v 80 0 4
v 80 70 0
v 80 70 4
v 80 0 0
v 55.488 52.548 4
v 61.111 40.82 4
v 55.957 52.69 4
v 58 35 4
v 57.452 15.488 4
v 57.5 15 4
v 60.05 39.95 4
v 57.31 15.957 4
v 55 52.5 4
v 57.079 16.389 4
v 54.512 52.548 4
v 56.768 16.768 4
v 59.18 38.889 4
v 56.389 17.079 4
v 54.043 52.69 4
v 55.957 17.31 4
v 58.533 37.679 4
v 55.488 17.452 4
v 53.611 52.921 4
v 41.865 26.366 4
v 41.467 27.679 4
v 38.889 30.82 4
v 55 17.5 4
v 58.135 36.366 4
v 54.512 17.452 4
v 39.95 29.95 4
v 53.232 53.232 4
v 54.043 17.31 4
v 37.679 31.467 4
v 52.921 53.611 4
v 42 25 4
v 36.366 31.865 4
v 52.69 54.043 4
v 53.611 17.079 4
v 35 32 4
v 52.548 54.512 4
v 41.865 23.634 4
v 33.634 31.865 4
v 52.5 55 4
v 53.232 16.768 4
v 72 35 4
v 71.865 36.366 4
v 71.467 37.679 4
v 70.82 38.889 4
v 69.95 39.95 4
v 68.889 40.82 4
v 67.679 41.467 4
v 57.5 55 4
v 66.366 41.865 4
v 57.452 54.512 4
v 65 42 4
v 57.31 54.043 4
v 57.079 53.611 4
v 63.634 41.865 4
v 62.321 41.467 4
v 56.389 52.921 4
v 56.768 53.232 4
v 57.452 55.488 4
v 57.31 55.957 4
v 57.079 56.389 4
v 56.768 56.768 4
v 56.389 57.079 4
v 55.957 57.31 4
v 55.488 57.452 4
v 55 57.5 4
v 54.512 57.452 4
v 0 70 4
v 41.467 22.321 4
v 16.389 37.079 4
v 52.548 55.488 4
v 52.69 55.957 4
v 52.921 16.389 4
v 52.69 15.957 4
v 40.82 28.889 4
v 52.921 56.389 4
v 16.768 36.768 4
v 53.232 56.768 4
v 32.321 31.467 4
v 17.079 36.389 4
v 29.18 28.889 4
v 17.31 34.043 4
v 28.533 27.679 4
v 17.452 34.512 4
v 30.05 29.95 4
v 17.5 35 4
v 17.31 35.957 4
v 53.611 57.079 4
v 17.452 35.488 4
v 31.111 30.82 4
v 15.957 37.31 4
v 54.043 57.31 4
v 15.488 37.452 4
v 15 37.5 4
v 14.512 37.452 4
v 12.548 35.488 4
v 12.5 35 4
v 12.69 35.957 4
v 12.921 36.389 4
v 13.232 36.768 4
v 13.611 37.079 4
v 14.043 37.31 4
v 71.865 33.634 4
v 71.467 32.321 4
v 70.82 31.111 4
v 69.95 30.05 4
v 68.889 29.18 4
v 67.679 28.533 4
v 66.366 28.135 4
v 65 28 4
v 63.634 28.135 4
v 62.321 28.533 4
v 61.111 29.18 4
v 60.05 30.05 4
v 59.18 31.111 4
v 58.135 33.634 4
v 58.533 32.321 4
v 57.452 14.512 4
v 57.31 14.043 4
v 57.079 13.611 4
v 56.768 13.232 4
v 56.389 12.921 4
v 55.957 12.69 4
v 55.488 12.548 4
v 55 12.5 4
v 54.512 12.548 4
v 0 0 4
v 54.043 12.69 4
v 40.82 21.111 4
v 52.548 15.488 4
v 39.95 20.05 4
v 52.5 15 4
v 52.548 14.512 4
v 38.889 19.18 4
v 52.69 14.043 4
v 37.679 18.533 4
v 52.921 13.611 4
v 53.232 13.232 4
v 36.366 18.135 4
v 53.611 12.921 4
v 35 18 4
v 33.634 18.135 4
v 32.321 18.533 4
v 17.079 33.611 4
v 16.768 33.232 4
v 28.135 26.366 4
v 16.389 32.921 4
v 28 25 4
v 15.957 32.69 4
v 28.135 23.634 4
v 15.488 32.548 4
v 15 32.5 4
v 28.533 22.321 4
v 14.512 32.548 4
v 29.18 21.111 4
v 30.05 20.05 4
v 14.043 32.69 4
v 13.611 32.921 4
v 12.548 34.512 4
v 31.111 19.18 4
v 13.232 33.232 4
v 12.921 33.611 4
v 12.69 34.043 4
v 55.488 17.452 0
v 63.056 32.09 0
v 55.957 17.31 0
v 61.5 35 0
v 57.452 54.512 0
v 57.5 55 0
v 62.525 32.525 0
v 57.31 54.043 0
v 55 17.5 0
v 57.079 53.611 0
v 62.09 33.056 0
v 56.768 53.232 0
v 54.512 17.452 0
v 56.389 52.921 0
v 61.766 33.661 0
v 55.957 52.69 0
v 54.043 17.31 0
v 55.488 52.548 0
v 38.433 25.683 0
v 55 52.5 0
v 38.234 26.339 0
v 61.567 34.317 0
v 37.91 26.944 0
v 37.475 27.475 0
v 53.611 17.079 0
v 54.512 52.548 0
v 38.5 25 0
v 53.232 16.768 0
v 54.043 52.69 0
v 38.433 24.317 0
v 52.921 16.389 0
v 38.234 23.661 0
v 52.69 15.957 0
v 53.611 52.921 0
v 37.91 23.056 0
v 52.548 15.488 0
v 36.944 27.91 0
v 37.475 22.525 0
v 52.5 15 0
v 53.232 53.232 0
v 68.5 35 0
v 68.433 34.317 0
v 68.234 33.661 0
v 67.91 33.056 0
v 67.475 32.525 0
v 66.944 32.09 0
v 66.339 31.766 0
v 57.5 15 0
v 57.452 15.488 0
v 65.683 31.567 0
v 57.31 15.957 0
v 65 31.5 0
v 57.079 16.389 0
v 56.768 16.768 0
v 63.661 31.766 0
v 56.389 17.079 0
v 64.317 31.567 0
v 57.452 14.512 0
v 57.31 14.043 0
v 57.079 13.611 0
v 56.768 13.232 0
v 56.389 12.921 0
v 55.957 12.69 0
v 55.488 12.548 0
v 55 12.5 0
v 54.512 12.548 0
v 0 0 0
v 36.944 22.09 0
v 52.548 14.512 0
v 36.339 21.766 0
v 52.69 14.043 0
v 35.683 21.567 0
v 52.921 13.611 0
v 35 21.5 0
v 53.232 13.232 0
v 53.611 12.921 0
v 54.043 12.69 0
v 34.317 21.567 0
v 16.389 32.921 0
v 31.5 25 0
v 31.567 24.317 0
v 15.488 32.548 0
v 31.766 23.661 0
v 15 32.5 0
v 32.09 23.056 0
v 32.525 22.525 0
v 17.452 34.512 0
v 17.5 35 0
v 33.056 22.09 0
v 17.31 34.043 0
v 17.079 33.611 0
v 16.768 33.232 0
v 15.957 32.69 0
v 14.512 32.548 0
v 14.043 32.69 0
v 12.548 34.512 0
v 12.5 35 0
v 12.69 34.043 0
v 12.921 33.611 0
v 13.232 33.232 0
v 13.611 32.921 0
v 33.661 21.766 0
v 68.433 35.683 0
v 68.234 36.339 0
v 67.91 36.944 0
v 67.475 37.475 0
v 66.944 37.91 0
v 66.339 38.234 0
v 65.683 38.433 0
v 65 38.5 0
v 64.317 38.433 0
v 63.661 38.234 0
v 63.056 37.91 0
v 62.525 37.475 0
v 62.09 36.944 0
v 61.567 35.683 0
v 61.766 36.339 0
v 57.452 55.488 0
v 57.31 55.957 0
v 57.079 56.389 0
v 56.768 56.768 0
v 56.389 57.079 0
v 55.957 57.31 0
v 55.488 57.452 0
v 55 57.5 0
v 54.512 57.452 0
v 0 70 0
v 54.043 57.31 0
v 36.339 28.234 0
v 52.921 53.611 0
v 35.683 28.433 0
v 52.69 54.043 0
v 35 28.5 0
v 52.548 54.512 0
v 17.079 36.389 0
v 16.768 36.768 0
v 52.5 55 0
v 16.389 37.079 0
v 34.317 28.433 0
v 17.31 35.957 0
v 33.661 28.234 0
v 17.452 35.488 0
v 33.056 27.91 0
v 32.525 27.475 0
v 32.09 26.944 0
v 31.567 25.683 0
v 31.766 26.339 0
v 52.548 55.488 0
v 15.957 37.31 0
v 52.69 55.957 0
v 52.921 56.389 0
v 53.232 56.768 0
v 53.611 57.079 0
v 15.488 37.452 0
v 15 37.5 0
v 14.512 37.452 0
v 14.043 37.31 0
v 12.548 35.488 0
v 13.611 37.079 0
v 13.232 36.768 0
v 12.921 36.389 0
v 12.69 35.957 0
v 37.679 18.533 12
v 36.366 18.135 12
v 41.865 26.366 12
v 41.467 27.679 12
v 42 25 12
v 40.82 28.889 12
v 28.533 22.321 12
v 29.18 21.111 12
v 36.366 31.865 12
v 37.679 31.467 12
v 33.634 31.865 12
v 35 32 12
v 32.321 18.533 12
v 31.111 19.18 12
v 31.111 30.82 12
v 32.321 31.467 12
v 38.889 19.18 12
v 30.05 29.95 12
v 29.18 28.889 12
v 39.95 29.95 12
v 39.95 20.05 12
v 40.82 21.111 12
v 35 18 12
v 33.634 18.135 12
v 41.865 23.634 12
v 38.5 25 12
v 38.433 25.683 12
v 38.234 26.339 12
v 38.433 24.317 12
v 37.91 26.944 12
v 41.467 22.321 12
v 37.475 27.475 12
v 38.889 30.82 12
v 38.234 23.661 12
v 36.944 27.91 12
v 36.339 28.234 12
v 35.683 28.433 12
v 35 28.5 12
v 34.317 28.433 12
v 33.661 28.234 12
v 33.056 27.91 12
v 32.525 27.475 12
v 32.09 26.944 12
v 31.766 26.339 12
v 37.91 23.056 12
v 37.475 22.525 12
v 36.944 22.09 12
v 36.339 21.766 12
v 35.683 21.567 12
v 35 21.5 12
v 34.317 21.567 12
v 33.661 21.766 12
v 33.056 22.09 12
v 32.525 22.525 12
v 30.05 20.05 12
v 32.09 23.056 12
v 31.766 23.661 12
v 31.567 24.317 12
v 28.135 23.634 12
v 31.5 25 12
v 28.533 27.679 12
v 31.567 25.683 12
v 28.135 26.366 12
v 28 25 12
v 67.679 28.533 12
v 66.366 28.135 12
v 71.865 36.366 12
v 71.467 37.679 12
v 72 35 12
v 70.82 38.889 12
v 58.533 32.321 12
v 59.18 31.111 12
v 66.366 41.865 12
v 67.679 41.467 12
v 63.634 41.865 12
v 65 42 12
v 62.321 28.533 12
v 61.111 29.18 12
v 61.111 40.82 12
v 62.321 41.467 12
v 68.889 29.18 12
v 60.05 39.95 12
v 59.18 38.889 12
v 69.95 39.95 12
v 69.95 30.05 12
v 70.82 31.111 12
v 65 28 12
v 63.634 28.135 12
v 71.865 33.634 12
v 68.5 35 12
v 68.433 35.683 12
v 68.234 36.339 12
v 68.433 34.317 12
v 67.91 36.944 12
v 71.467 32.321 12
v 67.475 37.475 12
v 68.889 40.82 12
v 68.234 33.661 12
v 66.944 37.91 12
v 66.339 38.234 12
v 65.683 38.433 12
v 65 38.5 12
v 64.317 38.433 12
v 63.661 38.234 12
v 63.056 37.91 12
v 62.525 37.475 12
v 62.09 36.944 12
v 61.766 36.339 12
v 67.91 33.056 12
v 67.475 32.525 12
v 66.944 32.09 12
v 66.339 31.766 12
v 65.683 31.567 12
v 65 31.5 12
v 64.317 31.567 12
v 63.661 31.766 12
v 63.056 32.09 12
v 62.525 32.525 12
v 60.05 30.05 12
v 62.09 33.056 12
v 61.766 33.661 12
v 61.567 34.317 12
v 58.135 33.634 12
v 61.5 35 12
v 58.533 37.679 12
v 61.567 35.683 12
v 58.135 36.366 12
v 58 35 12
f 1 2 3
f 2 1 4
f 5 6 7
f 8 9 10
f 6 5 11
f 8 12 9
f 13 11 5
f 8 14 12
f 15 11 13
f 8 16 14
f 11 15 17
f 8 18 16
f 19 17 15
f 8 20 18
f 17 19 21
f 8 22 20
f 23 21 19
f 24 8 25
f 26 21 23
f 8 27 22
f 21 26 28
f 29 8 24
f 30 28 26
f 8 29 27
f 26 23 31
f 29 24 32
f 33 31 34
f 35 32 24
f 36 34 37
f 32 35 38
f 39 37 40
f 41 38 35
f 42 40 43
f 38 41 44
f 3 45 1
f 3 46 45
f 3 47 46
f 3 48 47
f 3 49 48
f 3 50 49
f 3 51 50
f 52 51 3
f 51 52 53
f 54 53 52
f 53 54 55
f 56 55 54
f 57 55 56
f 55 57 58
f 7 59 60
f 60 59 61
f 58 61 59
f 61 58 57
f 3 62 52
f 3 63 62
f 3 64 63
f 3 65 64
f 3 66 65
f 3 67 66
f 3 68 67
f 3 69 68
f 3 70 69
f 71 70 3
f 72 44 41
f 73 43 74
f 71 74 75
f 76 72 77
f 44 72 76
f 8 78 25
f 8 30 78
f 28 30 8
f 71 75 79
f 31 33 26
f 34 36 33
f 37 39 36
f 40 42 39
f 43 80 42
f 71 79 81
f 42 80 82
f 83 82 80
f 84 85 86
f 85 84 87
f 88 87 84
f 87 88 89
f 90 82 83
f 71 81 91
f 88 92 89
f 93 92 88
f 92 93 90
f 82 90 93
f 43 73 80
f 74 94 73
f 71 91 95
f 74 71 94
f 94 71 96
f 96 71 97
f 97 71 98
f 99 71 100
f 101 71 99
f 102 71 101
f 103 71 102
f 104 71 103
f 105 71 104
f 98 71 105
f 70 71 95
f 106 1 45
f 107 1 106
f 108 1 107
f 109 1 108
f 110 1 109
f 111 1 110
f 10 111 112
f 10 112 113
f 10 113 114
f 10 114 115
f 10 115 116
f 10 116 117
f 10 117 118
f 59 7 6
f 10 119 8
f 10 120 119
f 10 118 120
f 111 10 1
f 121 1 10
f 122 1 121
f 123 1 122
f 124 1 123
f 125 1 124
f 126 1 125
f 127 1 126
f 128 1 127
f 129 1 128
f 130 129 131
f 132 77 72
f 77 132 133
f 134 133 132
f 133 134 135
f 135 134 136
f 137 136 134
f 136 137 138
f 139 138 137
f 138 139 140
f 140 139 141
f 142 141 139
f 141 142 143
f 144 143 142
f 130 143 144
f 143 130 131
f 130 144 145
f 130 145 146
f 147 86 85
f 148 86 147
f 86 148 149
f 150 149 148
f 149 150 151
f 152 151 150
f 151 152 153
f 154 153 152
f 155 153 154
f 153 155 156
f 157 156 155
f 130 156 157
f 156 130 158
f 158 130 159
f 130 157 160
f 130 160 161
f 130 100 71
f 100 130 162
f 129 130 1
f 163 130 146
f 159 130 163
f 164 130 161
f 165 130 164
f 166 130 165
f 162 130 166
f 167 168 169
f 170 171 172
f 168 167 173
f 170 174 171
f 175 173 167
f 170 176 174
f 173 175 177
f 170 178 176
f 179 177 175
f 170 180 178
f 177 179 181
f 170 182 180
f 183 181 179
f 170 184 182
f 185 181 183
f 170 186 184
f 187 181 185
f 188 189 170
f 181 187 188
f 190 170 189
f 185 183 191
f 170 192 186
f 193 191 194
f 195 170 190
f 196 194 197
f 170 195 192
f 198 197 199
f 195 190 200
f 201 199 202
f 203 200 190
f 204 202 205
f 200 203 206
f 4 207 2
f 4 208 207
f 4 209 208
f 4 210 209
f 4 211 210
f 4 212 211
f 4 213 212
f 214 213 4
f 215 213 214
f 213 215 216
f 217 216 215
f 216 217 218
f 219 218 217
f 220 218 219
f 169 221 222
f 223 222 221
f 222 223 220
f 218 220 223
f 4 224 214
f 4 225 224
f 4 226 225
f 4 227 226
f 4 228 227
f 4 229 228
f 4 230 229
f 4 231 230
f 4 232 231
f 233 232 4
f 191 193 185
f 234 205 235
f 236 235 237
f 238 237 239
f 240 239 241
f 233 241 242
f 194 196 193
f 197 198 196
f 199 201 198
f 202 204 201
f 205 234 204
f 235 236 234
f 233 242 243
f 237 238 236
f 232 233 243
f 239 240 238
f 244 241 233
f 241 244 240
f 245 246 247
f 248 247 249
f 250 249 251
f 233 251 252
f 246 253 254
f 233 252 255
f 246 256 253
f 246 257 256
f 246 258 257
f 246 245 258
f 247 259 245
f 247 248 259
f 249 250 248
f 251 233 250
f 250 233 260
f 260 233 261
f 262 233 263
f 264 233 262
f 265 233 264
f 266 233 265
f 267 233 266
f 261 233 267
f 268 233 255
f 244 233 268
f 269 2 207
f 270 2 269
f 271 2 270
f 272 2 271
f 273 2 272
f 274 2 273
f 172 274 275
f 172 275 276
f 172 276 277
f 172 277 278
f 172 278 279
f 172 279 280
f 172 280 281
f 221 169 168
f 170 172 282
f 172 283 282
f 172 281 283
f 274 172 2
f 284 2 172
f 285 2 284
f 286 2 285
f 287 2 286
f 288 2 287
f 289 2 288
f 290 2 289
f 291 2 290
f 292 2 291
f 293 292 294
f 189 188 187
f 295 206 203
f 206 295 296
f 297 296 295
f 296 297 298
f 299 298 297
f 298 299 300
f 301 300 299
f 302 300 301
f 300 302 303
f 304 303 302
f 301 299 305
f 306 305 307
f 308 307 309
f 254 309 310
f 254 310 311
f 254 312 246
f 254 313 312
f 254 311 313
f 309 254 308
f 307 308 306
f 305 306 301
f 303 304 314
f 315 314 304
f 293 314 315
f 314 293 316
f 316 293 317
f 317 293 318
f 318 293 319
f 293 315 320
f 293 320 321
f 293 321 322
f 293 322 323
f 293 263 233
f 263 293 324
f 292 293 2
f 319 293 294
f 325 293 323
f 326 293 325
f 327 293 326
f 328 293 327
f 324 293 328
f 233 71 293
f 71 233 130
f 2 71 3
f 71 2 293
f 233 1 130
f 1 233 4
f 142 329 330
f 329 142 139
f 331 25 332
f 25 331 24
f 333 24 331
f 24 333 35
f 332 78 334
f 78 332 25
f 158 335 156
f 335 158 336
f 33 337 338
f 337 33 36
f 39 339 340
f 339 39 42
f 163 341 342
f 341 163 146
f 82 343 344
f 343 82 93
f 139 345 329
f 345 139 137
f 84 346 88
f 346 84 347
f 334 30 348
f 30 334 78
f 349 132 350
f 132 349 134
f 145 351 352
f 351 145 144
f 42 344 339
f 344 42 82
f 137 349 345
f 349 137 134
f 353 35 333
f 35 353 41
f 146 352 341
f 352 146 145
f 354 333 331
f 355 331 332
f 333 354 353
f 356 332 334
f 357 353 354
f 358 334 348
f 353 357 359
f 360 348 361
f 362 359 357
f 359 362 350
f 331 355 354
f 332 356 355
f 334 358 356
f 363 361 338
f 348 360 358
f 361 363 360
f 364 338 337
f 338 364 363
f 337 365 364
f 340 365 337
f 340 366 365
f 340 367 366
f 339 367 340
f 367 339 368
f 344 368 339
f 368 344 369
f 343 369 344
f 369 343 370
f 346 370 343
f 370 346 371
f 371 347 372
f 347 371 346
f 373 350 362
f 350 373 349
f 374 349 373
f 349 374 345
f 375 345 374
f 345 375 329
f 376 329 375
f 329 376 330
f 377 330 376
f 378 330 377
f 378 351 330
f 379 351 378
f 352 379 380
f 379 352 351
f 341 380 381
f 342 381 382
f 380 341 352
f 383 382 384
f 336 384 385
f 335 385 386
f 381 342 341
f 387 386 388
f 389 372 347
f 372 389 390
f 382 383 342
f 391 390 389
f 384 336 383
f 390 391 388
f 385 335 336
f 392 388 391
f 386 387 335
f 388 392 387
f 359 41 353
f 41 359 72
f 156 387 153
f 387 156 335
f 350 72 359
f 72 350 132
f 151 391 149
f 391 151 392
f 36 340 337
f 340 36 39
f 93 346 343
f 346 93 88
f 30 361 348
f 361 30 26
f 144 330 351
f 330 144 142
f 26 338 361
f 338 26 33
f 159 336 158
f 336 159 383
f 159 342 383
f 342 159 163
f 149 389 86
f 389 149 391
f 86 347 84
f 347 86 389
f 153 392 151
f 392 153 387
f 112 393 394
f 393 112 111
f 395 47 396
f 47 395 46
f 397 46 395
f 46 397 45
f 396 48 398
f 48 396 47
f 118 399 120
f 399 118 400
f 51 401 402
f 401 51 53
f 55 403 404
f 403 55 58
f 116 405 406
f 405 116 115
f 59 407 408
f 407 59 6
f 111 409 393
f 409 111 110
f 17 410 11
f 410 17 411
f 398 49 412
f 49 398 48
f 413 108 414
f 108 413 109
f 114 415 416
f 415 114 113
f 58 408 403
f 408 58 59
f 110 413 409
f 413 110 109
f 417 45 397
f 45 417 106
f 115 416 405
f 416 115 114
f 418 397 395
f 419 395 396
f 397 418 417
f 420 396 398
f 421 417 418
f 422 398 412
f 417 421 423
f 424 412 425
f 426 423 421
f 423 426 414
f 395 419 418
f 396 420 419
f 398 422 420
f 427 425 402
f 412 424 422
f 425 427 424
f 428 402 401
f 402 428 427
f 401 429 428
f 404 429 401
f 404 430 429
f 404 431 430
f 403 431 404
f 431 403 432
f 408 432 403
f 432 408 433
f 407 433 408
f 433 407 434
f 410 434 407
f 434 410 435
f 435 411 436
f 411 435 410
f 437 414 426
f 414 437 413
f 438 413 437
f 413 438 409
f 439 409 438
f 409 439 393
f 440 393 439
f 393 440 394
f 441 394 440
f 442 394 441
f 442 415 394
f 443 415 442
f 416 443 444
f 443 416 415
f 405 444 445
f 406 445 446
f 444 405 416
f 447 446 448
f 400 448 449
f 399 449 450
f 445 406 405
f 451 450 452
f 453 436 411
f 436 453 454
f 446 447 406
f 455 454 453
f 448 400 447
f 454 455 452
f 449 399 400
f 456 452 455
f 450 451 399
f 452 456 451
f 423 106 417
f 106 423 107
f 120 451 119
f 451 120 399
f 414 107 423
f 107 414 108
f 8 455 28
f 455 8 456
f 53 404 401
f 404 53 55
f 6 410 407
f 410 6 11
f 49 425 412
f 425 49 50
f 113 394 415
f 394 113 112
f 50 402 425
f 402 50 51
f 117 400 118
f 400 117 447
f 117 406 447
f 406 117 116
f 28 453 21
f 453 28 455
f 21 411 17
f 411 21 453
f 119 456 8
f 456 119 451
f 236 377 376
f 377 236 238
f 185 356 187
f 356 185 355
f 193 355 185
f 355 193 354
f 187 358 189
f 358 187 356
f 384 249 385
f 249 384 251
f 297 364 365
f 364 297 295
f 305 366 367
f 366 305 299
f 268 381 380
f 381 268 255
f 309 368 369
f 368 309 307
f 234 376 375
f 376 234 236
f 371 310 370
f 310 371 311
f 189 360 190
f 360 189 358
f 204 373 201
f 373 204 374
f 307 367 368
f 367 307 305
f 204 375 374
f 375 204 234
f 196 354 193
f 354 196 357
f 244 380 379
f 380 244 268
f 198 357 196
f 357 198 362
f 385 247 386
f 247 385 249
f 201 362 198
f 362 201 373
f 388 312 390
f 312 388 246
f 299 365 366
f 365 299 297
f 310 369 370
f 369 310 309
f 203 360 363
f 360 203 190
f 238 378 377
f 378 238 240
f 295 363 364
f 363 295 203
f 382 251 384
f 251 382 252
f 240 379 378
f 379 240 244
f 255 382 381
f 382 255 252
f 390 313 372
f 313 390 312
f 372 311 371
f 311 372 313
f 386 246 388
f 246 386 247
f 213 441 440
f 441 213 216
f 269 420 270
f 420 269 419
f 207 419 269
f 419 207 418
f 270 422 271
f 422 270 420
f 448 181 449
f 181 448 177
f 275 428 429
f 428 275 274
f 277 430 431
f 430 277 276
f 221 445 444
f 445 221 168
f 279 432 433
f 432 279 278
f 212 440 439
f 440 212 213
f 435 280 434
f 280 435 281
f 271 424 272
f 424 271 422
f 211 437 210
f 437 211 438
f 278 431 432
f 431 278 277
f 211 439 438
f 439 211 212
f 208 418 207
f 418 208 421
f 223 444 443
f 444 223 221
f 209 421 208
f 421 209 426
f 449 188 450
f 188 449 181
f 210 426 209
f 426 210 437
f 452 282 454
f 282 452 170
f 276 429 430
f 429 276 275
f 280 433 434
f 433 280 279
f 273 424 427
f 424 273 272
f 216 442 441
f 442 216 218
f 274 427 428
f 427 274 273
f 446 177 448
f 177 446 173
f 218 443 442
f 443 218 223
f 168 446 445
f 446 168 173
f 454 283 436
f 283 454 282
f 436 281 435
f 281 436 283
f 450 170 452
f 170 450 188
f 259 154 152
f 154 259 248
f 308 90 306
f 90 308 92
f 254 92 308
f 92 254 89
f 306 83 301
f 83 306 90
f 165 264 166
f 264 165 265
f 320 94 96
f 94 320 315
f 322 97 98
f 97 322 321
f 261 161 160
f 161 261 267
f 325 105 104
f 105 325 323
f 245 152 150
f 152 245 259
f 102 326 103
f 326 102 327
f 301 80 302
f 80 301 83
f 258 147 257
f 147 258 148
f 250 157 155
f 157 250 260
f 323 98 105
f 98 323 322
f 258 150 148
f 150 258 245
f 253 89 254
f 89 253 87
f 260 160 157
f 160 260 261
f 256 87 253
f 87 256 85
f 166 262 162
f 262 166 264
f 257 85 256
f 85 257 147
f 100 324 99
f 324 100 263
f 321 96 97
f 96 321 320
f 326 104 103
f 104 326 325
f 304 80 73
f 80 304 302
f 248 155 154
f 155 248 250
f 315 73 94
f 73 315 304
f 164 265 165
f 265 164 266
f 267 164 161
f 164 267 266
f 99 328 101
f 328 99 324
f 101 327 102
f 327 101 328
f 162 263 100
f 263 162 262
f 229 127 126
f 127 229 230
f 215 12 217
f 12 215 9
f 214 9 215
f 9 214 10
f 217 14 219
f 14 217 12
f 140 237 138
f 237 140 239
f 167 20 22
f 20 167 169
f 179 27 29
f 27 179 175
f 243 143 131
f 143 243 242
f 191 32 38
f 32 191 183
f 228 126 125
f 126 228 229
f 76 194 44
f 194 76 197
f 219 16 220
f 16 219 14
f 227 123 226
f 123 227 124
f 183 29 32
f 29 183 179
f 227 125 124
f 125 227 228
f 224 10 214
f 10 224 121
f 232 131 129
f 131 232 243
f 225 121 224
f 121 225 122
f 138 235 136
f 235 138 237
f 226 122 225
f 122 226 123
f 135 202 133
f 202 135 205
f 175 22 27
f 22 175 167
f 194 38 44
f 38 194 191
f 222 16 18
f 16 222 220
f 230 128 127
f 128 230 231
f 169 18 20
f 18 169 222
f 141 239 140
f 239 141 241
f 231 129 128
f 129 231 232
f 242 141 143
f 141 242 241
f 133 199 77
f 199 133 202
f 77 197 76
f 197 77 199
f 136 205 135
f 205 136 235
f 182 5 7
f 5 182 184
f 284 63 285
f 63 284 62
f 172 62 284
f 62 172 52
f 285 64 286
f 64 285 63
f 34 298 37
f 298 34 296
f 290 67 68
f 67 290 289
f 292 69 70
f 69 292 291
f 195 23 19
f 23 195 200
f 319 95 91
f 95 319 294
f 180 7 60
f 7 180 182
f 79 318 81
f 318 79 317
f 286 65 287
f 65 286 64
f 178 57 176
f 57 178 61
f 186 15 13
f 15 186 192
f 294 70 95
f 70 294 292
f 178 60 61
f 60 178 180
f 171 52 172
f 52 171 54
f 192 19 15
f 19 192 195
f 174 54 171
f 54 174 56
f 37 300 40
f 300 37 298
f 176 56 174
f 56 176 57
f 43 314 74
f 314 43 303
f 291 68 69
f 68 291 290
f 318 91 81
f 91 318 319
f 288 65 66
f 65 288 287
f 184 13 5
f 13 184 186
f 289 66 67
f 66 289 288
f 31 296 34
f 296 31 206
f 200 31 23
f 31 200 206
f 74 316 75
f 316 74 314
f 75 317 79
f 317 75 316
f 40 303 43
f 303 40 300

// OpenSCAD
$fn = 32;

// ----------------------------------------------------------------------
// Mixed field: bosses and holes at given coordinates
// ----------------------------------------------------------------------

// --- parameters (mm) ---
plate_l = 80;             // plate length, X
plate_w = 70;             // plate width, Y
plate_t = 4;              // plate thickness, Z
boss_d = 14;              // boss diameter
boss_h = 8;               // boss height above the plate
hole_d = 5;               // through hole diameter

total_h = plate_t + boss_h;  // overall height

difference() {
  union() {
    cube([plate_l, plate_w, plate_t]);
    translate([35, 25, plate_t]) cylinder(h = boss_h, d = boss_d);
    translate([65, 35, plate_t]) cylinder(h = boss_h, d = boss_d);
  }
  translate([35, 25, -1]) cylinder(h = total_h + 2, d = boss_d / 2);
  translate([65, 35, -1]) cylinder(h = total_h + 2, d = boss_d / 2);
  translate([15, 35, -1]) cylinder(h = plate_t + 2, d = hole_d);
  translate([55, 15, -1]) cylinder(h = plate_t + 2, d = hole_d);
  translate([55, 55, -1]) cylinder(h = plate_t + 2, d = hole_d);
}
